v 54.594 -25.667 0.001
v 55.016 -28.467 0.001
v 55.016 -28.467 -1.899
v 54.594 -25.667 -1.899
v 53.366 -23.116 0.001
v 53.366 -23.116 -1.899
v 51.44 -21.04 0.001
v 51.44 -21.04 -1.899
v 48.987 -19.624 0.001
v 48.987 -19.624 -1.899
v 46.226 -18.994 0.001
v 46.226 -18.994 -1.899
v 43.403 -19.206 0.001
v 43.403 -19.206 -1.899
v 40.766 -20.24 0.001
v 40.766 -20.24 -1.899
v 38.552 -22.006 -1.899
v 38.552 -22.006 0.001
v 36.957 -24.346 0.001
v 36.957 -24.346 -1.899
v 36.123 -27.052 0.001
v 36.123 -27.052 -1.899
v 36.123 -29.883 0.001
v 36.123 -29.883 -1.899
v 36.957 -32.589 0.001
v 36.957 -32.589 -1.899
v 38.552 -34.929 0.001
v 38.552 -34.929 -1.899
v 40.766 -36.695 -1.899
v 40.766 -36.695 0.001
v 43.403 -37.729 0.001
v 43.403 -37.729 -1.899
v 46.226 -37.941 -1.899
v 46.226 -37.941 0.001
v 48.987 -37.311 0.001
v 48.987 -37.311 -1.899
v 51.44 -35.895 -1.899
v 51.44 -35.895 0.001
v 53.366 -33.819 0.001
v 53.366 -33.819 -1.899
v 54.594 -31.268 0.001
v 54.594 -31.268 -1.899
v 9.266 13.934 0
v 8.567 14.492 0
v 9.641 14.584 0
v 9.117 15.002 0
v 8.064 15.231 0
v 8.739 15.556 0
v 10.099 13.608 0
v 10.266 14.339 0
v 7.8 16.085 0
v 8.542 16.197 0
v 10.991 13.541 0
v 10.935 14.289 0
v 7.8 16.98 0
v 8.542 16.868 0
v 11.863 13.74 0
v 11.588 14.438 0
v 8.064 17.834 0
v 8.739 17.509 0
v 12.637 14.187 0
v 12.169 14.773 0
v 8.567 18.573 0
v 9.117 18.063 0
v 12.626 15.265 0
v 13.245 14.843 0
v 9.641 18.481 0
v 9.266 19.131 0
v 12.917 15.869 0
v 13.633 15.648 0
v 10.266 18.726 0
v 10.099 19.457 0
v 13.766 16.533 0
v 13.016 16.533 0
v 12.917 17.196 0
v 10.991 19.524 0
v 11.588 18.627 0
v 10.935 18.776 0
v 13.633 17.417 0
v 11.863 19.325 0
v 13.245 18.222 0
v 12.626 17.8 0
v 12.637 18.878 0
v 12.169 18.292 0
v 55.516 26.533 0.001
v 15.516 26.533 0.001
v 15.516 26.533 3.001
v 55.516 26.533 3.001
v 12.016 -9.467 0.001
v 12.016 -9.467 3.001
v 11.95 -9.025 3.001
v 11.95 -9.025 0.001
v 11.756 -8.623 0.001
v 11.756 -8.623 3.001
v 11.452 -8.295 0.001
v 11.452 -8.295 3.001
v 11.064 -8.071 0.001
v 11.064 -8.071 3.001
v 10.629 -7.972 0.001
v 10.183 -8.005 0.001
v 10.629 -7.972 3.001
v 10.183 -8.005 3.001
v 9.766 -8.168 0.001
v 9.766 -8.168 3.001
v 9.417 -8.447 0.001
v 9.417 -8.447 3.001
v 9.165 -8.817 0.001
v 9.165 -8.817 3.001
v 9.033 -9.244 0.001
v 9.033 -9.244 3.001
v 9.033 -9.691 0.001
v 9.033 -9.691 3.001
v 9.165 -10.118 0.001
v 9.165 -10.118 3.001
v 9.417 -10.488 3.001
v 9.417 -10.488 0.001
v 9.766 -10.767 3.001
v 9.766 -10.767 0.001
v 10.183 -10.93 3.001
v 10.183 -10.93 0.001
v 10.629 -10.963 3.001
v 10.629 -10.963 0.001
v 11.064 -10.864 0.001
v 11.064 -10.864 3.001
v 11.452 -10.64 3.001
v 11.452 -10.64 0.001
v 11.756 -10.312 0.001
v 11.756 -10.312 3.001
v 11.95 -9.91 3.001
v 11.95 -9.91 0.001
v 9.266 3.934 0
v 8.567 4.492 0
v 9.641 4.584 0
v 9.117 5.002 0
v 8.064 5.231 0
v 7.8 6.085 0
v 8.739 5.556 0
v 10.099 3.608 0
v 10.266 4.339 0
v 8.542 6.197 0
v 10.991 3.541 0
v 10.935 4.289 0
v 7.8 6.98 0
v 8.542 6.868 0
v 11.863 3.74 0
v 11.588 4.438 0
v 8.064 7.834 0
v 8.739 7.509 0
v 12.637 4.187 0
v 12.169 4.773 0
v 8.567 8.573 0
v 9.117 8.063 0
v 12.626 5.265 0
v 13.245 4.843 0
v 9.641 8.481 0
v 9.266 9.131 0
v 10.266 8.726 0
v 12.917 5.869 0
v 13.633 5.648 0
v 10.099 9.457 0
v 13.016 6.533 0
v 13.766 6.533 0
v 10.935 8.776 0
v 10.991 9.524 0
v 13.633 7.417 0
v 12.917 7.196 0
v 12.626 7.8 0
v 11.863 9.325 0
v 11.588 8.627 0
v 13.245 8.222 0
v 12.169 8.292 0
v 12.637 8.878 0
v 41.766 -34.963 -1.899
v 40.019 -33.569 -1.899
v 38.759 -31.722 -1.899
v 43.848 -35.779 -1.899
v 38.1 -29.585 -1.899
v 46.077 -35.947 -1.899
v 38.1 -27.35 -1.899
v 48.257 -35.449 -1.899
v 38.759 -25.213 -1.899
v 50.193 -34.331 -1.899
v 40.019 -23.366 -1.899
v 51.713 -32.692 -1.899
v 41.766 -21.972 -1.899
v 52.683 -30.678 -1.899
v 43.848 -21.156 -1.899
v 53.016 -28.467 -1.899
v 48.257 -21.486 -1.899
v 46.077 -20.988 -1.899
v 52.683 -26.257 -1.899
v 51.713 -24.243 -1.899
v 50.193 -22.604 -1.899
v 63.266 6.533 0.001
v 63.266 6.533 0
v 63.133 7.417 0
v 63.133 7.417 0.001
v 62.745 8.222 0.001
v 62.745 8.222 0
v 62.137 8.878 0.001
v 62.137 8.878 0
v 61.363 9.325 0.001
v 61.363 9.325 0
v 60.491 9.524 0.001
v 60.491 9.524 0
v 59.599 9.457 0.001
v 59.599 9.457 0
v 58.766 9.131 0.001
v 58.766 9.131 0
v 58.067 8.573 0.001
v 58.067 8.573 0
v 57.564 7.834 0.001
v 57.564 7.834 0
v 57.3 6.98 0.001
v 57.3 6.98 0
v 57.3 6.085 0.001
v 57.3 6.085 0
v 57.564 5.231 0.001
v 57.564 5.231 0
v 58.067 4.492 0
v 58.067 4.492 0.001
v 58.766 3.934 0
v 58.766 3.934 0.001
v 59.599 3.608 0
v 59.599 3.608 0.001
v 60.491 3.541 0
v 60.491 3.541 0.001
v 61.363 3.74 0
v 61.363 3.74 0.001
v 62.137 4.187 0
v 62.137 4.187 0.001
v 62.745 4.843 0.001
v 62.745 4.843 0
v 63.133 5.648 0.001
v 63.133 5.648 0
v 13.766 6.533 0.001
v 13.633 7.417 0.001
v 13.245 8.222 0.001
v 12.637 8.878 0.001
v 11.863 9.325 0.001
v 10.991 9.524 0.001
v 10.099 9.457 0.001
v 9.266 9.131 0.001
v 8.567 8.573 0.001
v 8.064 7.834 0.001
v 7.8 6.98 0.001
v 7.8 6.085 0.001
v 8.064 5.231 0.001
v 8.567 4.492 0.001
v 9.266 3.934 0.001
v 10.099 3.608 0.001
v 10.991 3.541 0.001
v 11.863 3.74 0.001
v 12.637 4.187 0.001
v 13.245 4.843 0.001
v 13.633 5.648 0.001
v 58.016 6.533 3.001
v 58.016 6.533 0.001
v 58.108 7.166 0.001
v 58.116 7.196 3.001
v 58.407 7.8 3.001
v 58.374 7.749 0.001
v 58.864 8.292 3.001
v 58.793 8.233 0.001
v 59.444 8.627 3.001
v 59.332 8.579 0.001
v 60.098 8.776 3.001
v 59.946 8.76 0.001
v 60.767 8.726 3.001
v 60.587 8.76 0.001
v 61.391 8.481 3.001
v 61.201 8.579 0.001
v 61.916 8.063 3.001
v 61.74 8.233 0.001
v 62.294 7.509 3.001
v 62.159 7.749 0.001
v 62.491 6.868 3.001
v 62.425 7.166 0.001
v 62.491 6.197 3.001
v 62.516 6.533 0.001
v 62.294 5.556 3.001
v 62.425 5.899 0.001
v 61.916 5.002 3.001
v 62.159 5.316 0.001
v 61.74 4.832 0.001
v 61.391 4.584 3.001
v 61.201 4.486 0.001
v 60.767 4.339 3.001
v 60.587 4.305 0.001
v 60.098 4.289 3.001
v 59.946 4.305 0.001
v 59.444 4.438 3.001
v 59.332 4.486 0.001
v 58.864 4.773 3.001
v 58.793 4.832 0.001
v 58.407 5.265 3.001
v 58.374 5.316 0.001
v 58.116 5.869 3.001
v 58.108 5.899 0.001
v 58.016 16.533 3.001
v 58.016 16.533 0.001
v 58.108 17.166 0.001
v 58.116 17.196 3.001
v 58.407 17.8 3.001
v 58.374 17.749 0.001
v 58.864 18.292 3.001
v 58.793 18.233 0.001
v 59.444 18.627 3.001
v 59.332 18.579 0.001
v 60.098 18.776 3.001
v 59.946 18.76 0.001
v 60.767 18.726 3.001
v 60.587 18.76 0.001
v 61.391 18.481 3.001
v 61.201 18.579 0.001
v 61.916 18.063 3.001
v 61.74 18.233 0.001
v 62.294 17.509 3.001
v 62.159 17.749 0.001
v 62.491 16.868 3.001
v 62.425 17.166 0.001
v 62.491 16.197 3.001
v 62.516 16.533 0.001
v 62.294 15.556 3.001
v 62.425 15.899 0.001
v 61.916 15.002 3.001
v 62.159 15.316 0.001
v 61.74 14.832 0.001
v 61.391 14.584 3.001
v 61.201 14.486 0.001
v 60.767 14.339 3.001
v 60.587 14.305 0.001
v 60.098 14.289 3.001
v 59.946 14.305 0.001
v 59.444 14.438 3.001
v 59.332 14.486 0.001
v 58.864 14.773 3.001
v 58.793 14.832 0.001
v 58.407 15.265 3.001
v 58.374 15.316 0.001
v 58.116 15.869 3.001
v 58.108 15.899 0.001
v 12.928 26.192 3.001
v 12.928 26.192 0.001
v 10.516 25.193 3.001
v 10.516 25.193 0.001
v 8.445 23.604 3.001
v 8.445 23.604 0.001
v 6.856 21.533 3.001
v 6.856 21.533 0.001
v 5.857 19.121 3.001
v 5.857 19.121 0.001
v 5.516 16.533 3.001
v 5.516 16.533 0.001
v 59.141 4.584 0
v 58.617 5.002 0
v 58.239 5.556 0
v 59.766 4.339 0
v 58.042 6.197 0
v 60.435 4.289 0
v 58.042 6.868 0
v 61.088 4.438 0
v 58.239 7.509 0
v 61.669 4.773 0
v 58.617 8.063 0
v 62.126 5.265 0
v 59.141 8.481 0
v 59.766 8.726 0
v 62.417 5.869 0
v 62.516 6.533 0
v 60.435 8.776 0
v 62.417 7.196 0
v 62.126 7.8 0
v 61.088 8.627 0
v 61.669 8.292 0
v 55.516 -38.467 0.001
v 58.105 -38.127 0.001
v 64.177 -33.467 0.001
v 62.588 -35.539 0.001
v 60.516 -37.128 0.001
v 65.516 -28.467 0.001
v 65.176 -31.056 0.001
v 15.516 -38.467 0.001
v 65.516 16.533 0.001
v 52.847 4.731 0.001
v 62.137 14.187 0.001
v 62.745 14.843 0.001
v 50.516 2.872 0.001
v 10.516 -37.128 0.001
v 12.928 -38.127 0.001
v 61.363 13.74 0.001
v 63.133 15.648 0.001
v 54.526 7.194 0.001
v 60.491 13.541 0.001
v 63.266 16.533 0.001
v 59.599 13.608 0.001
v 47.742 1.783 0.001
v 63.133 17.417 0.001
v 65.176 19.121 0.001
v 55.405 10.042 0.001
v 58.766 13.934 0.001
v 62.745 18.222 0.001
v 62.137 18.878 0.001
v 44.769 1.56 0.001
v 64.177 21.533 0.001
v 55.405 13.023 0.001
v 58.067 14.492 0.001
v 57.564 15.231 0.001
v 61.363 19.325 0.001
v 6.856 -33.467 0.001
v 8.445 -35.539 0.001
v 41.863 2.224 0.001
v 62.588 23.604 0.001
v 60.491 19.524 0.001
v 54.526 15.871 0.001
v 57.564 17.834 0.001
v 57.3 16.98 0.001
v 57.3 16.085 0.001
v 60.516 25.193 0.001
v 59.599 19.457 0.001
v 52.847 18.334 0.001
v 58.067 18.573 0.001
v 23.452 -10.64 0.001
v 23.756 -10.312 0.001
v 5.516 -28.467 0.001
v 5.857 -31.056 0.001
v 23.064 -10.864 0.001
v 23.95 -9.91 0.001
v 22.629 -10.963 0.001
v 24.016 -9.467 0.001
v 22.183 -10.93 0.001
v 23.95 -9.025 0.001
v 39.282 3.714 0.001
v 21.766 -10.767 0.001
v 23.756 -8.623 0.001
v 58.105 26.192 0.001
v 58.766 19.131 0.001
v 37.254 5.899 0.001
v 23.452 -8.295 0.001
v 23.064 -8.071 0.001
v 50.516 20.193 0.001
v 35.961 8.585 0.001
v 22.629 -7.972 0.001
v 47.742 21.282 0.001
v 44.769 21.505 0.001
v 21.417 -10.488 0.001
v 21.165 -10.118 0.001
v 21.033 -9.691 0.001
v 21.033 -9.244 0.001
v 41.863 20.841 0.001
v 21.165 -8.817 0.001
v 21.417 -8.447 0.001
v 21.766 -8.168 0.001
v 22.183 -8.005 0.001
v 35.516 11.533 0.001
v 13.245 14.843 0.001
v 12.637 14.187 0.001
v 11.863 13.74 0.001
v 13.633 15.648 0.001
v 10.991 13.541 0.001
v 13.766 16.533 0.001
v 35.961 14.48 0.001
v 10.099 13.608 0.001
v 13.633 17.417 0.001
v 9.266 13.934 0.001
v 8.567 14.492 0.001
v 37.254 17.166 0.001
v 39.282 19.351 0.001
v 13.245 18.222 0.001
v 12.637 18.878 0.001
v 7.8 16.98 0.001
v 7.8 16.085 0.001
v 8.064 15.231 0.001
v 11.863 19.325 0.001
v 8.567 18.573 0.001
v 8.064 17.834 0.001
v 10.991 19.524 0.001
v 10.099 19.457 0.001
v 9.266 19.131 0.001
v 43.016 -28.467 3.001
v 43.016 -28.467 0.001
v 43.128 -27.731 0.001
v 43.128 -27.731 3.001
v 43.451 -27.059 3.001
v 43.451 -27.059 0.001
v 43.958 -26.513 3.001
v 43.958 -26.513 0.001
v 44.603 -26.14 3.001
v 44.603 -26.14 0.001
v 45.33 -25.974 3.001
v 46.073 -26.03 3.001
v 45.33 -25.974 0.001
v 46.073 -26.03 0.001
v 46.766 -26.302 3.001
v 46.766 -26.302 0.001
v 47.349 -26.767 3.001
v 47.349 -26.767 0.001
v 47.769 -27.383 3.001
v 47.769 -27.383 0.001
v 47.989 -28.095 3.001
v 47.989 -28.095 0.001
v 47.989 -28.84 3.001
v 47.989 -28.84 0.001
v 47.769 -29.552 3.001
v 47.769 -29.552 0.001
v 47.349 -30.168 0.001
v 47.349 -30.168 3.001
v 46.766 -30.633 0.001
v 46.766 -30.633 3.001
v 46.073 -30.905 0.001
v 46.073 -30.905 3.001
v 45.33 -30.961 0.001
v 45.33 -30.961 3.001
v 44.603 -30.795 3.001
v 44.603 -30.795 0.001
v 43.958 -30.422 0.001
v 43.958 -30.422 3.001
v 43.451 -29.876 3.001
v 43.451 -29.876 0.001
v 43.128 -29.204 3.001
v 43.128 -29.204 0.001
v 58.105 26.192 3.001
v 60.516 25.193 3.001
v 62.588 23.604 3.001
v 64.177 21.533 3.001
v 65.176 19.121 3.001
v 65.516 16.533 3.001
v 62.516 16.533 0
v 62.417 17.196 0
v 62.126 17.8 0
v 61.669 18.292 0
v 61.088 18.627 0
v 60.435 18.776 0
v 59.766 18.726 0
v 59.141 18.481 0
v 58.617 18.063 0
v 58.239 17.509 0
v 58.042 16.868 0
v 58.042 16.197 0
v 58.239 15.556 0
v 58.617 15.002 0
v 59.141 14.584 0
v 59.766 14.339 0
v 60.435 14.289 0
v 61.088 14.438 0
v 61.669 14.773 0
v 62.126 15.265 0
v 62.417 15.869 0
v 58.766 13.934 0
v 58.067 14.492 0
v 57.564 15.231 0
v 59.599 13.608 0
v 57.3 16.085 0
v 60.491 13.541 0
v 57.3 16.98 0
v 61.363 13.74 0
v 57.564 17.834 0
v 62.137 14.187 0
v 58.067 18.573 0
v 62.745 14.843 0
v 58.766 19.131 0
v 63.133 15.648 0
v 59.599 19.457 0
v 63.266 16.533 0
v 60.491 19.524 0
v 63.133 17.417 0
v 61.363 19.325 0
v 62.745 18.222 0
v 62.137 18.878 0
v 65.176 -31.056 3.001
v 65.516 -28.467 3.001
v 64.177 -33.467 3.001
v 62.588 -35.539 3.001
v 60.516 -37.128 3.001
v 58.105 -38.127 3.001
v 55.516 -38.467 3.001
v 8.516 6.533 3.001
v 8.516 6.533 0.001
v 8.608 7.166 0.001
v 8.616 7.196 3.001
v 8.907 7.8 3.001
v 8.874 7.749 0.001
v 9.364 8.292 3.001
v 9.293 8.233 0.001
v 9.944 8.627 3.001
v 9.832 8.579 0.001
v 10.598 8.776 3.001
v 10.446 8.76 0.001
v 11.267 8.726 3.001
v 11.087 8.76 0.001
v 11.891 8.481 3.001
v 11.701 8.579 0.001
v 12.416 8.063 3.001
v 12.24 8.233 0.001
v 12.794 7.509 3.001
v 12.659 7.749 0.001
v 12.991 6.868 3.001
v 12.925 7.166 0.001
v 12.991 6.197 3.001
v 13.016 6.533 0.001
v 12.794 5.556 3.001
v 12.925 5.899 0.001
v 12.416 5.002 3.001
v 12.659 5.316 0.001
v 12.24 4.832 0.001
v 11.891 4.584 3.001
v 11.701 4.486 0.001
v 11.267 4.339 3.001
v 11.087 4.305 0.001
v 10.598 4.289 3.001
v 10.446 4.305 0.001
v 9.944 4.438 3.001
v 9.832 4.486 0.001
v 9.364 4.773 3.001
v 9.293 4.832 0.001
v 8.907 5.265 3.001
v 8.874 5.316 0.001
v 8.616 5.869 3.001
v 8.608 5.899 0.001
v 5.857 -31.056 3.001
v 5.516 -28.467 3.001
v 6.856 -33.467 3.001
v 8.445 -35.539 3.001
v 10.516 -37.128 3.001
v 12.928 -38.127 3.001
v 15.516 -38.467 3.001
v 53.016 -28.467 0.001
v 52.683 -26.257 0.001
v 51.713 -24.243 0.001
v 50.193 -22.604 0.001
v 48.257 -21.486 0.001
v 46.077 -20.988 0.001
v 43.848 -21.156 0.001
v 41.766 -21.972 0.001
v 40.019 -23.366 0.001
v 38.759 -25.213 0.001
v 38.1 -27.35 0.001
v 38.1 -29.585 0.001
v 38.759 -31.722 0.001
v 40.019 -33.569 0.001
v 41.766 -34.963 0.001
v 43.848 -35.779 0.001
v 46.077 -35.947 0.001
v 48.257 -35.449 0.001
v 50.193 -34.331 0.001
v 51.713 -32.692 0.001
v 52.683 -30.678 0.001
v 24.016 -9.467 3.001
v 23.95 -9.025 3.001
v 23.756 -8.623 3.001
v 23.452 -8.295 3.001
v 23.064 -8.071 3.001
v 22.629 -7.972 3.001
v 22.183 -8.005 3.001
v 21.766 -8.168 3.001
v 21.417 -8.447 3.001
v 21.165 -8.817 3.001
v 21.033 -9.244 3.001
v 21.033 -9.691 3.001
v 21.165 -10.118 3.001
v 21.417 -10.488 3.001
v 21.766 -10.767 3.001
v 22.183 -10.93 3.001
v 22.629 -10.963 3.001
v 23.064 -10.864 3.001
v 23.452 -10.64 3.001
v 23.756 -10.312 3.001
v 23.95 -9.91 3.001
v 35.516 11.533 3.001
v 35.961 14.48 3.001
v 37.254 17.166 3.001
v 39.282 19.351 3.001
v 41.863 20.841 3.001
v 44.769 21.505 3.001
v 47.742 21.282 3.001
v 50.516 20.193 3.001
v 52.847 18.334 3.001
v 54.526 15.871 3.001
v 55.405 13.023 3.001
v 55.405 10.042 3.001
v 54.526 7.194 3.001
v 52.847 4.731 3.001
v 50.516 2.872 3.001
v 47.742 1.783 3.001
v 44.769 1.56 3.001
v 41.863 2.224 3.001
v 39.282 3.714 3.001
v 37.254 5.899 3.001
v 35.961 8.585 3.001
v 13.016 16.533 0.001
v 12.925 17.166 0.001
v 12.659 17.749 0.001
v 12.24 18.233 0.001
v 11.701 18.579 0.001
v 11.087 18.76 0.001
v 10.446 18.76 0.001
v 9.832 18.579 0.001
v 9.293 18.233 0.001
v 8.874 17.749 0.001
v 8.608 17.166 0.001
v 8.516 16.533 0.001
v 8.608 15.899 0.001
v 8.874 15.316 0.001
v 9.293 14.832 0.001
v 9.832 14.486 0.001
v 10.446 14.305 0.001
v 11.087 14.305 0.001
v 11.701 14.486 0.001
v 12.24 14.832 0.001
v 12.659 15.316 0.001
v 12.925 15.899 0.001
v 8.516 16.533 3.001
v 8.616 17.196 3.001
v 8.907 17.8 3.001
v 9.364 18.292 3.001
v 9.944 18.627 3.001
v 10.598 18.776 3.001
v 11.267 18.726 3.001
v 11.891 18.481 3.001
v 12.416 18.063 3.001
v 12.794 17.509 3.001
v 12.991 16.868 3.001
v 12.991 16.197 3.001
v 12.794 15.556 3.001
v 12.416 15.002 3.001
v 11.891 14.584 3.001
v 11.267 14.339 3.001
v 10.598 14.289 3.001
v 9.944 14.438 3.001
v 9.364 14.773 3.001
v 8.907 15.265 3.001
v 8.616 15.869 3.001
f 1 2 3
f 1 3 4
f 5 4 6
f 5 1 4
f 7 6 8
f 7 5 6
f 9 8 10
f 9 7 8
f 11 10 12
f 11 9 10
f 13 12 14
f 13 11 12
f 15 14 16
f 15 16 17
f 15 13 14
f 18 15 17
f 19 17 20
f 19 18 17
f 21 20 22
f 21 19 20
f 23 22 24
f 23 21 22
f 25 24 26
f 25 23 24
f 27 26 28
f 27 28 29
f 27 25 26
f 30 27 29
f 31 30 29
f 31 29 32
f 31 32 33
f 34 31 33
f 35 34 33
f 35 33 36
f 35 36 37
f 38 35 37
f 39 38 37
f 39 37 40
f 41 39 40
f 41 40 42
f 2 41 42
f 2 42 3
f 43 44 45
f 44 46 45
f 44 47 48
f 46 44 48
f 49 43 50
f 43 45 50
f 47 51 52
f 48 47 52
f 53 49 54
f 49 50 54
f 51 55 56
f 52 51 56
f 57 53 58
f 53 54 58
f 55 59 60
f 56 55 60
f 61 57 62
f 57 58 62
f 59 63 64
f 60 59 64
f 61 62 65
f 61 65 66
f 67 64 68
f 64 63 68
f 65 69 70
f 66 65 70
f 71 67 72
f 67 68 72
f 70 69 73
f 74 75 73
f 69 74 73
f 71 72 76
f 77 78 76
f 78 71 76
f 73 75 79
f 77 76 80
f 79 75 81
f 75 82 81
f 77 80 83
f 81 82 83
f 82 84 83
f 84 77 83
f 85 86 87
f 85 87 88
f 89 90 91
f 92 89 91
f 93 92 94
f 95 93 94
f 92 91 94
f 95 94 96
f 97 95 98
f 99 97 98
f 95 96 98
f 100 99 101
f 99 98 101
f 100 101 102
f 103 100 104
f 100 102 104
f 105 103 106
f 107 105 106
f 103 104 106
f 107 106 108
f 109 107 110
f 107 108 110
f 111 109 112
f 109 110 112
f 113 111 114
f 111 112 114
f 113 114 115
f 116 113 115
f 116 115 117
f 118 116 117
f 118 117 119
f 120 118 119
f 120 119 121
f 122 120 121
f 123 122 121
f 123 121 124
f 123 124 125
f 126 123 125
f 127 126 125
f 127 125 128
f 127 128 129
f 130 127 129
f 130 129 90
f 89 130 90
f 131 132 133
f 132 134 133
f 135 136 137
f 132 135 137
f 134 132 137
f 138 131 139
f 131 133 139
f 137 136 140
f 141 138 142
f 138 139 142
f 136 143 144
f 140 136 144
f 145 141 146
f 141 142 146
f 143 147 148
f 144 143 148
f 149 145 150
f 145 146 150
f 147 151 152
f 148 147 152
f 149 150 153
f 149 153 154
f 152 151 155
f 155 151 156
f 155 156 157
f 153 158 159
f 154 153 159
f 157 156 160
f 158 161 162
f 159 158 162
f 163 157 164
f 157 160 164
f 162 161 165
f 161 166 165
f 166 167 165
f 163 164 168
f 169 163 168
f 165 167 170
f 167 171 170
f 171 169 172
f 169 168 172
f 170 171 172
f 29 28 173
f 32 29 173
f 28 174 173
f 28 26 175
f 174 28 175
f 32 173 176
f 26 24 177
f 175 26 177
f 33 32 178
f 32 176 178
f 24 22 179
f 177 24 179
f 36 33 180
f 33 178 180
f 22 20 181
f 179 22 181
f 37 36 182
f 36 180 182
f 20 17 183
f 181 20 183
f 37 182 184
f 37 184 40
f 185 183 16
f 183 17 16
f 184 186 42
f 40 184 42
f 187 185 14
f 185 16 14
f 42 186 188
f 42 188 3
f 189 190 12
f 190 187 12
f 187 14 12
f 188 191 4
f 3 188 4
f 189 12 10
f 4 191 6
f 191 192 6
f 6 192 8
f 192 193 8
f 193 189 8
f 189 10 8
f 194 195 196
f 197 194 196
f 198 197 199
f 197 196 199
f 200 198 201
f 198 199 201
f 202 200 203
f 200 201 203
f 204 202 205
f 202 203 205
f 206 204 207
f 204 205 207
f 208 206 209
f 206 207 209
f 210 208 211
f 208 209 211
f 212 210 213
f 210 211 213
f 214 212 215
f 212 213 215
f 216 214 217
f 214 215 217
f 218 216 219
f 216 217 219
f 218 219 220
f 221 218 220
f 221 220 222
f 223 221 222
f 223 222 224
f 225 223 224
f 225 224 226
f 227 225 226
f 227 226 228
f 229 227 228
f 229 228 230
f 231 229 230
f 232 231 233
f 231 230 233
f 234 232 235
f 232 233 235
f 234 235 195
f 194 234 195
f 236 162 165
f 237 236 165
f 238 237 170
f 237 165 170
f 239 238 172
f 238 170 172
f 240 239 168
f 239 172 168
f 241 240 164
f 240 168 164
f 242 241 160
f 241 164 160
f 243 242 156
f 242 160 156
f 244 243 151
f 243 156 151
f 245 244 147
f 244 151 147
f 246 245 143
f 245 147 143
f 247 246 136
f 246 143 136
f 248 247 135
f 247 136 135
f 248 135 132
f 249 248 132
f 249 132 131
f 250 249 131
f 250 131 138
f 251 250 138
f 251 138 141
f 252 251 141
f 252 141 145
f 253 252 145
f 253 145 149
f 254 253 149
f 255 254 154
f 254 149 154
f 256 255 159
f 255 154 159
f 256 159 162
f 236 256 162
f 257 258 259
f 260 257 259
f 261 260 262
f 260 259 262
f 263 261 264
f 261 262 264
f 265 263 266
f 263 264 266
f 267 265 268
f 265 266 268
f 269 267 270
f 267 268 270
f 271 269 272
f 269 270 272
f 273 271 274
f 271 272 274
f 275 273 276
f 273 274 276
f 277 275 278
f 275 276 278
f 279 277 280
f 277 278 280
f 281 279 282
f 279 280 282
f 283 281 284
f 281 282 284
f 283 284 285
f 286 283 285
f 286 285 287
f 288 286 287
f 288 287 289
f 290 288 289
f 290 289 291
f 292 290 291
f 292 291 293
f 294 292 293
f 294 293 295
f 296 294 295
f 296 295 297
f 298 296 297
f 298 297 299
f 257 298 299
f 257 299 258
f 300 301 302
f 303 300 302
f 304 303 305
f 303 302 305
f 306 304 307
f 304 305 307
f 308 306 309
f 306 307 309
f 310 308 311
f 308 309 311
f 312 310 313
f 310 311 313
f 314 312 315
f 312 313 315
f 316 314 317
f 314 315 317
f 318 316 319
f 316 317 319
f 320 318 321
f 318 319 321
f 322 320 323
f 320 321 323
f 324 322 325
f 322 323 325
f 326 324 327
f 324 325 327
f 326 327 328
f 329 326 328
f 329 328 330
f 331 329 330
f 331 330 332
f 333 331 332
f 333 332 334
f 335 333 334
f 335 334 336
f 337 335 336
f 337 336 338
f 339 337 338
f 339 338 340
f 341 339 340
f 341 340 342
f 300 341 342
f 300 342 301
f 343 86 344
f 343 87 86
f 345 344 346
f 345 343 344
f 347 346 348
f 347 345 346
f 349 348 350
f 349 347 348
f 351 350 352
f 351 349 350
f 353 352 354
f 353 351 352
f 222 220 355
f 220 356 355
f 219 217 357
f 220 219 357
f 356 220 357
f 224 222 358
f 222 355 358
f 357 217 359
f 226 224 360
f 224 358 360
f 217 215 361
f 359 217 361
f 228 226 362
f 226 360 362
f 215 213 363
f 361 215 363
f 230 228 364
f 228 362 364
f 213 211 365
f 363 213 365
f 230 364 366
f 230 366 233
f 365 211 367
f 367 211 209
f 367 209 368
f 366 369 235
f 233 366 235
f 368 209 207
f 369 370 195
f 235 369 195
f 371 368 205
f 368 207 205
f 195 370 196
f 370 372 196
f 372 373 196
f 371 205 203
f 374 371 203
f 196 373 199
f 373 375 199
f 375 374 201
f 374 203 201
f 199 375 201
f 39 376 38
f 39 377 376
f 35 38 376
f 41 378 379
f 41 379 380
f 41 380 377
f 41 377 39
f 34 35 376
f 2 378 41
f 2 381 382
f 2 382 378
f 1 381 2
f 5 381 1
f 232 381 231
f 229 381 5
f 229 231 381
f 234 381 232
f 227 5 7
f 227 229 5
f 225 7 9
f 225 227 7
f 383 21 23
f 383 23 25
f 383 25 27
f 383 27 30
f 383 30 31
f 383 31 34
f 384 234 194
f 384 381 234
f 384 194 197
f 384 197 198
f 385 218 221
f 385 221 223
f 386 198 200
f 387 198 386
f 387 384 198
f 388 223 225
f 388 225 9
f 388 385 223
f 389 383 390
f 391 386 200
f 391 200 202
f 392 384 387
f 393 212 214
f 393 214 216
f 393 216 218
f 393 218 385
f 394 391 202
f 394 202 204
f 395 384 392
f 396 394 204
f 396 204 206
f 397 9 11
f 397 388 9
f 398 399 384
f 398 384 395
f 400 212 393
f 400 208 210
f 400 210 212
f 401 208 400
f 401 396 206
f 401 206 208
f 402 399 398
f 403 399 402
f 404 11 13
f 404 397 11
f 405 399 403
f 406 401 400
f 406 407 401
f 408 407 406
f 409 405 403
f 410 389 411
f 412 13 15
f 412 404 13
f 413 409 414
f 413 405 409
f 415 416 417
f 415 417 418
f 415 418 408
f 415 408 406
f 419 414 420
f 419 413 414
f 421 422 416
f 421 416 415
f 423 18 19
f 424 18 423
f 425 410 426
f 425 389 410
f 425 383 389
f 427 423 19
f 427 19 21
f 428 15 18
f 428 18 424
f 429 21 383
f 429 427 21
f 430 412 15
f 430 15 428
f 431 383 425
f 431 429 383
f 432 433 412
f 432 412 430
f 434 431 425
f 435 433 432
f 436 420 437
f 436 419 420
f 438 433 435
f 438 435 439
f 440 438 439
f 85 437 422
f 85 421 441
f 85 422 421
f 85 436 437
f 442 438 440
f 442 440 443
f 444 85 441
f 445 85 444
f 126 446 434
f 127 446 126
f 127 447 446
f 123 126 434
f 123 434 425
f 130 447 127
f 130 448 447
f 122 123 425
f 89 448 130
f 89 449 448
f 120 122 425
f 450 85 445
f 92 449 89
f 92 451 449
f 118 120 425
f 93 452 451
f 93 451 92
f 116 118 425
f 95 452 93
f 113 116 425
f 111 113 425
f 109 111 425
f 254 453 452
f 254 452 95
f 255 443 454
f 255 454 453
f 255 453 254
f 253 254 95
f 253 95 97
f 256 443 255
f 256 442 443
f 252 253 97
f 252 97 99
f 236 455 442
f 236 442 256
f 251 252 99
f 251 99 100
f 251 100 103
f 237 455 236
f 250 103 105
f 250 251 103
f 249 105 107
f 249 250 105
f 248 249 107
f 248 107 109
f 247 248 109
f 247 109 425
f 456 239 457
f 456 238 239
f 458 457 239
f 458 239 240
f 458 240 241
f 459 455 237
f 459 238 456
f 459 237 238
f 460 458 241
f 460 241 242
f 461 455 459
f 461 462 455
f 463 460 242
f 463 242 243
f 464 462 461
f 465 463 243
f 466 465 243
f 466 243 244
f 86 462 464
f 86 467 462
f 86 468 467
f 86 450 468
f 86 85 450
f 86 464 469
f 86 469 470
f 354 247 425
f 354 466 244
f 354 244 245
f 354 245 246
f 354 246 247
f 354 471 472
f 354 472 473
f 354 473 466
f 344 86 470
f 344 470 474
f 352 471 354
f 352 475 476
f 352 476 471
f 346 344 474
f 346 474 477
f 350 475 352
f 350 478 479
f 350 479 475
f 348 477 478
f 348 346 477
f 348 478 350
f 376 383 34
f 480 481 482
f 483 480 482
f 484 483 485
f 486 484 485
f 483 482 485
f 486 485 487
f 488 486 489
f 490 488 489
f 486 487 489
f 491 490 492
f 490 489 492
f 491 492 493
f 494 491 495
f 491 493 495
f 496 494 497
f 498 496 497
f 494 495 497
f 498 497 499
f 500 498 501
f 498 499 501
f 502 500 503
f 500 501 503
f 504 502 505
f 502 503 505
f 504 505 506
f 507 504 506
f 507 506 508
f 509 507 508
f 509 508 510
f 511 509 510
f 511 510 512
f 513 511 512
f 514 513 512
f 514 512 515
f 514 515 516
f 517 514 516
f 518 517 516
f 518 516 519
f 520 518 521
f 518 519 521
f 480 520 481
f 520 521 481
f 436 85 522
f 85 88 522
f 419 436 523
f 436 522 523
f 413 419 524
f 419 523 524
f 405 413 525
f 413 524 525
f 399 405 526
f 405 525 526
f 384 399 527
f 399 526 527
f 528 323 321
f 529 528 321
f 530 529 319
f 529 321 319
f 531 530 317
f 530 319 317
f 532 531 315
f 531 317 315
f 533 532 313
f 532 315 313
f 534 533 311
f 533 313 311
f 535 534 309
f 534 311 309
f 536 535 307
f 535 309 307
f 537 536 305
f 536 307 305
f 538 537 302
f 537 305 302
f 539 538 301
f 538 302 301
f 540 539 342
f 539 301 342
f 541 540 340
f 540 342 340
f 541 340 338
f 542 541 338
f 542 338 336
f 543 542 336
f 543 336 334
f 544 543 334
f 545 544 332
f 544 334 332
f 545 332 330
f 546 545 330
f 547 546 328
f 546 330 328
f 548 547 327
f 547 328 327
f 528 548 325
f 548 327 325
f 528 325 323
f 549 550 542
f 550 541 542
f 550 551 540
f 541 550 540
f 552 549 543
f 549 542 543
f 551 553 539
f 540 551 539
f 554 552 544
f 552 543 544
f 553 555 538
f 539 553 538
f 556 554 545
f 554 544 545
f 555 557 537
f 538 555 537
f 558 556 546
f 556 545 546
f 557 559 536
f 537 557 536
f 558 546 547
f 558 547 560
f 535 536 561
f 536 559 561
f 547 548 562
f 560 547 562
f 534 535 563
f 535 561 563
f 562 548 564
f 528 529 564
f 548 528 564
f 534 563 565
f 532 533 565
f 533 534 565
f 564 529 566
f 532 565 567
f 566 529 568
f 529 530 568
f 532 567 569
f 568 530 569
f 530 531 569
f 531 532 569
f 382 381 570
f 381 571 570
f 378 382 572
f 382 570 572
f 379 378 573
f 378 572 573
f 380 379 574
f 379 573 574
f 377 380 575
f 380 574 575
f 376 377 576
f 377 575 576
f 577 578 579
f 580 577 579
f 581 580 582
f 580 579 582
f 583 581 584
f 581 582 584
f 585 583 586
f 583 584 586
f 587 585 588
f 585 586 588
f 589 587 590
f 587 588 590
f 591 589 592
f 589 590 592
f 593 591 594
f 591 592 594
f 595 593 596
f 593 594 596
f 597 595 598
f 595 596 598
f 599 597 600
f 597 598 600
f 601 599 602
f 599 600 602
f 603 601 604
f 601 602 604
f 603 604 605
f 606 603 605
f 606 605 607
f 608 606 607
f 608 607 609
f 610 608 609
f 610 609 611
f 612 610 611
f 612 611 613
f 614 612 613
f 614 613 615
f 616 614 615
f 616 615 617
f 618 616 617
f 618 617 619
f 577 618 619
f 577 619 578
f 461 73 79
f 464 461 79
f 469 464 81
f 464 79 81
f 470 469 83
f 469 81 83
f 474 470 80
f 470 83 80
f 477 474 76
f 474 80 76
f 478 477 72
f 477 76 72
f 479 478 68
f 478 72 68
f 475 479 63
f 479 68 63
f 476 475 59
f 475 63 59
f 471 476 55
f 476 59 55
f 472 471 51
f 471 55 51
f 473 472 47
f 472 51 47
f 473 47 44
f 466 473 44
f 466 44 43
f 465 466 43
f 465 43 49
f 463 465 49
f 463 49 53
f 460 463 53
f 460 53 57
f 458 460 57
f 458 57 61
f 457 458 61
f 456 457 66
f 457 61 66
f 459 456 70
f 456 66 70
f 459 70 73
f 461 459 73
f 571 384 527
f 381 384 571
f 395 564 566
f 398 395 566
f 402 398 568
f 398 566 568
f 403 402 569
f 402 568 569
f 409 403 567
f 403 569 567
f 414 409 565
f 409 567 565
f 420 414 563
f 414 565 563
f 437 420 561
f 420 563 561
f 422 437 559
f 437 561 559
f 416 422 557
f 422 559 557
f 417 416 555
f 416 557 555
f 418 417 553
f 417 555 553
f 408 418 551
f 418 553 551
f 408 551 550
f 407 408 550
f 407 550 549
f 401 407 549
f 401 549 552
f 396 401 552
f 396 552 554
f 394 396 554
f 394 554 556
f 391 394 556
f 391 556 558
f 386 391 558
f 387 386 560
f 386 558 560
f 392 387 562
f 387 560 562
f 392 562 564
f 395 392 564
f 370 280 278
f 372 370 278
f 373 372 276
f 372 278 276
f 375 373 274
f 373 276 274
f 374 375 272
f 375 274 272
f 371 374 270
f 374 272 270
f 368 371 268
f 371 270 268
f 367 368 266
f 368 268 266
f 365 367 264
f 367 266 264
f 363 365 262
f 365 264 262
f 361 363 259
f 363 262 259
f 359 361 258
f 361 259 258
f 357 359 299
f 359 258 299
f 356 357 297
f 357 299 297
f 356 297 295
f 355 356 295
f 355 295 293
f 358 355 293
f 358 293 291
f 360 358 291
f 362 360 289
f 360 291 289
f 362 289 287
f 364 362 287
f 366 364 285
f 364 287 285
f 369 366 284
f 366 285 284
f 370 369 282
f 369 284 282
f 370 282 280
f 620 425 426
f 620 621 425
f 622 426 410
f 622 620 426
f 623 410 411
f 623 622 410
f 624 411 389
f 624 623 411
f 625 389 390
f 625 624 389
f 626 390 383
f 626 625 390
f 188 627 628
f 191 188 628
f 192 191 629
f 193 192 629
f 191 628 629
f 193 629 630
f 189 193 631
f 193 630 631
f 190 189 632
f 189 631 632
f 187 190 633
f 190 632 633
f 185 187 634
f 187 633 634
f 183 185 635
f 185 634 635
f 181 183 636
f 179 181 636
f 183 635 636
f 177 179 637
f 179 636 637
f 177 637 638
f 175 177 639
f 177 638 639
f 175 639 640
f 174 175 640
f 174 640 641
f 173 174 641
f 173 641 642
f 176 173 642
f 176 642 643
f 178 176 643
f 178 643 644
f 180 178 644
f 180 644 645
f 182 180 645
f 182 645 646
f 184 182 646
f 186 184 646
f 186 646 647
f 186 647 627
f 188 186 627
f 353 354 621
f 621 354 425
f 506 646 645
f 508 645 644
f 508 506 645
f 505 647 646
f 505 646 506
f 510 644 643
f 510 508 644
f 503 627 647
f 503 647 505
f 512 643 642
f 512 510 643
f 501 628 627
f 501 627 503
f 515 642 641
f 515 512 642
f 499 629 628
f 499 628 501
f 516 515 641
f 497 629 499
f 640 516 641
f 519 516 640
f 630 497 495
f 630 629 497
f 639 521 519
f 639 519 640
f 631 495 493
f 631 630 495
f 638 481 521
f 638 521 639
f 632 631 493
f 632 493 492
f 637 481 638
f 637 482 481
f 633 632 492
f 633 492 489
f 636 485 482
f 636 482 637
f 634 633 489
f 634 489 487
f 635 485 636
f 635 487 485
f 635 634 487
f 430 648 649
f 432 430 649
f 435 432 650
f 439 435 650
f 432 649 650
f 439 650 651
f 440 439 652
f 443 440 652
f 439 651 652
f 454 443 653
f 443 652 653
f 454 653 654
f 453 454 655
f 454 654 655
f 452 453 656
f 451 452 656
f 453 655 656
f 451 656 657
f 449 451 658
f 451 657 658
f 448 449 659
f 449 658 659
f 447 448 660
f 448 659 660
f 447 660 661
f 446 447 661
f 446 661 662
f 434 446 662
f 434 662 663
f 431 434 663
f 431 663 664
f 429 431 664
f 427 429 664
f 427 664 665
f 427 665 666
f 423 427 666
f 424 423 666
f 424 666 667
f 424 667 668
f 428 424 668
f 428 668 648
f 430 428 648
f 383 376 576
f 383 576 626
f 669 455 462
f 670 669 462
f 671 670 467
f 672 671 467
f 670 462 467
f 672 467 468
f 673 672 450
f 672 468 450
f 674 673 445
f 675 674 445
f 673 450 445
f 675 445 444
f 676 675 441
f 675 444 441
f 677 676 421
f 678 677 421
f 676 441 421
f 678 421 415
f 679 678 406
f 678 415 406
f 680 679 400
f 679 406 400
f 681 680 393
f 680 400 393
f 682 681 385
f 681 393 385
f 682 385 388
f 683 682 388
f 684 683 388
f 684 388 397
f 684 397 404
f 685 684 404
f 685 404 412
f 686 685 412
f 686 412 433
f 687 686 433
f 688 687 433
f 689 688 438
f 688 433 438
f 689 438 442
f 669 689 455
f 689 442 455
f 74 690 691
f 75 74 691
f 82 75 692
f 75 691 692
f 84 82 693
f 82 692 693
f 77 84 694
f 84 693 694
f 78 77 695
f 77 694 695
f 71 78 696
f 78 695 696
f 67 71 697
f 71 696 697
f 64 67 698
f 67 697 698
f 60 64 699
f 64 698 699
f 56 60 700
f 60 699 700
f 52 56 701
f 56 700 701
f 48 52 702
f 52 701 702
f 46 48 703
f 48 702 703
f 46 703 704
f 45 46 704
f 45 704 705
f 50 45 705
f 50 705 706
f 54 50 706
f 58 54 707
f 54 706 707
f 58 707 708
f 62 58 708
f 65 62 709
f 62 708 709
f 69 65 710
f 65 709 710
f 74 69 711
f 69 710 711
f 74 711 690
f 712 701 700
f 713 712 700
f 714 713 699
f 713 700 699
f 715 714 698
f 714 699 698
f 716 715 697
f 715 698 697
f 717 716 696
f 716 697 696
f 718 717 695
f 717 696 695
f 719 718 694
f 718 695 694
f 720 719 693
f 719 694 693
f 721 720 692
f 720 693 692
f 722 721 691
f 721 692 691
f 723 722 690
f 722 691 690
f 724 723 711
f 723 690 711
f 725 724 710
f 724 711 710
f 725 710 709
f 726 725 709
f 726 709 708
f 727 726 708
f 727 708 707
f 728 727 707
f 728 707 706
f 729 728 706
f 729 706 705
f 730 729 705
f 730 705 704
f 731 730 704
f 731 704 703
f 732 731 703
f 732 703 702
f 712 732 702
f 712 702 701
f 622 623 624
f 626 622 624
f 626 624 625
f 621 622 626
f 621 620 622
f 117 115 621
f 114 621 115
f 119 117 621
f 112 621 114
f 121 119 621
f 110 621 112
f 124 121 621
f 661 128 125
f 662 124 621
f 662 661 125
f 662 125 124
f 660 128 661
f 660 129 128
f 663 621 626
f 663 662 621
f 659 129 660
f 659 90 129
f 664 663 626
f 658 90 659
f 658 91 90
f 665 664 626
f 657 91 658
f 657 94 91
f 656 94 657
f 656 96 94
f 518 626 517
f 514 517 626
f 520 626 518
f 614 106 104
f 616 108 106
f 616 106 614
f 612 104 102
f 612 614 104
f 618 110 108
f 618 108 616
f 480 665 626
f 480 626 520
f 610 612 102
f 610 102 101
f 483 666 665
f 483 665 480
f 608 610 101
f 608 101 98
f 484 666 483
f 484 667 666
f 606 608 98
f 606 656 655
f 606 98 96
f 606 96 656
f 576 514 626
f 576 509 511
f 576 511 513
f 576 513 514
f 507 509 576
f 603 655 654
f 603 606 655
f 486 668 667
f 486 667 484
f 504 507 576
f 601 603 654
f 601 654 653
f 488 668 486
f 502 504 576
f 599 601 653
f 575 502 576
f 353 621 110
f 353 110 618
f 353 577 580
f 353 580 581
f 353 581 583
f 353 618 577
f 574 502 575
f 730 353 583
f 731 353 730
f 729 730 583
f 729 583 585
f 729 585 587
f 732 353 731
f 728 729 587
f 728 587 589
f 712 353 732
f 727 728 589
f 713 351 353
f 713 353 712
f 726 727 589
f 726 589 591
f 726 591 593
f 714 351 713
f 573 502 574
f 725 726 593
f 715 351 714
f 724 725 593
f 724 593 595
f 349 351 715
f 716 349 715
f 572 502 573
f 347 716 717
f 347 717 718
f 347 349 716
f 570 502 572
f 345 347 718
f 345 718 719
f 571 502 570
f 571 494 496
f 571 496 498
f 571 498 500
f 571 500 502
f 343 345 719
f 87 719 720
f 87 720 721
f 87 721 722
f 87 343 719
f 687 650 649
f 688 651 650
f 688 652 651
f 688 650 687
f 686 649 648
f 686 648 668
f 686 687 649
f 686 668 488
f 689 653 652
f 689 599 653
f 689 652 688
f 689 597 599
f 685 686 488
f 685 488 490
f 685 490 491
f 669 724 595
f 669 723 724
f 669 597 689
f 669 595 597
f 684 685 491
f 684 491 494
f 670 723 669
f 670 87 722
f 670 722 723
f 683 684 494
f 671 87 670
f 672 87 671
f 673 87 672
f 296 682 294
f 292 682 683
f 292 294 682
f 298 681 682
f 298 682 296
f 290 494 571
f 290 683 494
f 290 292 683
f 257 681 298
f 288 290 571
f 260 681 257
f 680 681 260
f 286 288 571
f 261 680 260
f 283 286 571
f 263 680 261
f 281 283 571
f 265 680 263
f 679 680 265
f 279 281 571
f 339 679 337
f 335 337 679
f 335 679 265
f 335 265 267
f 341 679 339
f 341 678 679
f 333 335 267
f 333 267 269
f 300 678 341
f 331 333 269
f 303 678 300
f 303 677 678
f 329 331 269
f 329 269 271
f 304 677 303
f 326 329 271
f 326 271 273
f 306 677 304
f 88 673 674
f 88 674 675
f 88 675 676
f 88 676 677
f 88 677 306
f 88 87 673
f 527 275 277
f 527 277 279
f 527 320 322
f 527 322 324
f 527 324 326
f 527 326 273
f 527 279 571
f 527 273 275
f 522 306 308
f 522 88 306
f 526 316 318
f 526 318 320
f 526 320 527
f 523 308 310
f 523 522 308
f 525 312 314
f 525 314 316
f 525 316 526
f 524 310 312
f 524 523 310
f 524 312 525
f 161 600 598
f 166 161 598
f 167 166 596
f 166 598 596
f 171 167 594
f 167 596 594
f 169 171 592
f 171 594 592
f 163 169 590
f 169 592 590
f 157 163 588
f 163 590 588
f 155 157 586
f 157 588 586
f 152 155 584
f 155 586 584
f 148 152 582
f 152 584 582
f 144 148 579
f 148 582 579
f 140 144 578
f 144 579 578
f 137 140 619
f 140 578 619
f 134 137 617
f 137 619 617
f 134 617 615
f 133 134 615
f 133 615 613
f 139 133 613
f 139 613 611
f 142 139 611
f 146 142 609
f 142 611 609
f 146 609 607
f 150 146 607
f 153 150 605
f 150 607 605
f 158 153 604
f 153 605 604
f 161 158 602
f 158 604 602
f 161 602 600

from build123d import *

# Parameters (mm, degrees)
SKETCH_3_R               = 3
EXTRUDE_6_DEPTH          = 0.001
EXTRUDE_6_2_DEPTH        = 0.001
EXTRUDE_6_3_DEPTH        = 0.001
EXTRUDE_6_4_DEPTH        = 0.001
SKETCH_11_R              = 2.25
CUT_EXTRUDE_2_DEPTH      = 1
CUT_EXTRUDE_2_DEPTH_BACK = 1.001
EXTRUDE_7_DEPTH          = 3
SKETCH_14_R              = 2.25
SKETCH_14_R_2            = 10
CUT_EXTRUDE_3_DEPTH      = 3
SKETCH_15_R              = 10
SKETCH_15_R_2            = 2.5
CUT_EXTRUDE_4_DEPTH      = 3
SKETCH_16_R              = 1.5
CUT_EXTRUDE_5_DEPTH      = 10
SKETCH_17_R              = 9.5
SKETCH_17_R_2            = 7.5
EXTRUDE_8_DEPTH          = 4.9
FILLET_1_R               = 10


with BuildPart() as part:
    # 草图3 → 凸台-拉伸6 (new body)
    with BuildSketch(Plane.XY):
        with Locations((60.266478541, 16.532501821)):
            Circle(SKETCH_3_R)
    extrude(amount=EXTRUDE_6_DEPTH)


with BuildPart() as body_2:
    # 草图3 → Extrude 6 2 (new body)
    with BuildSketch(Plane.XY):
        with Locations((60.266478541, 6.532501821)):
            Circle(SKETCH_3_R)
    extrude(amount=EXTRUDE_6_2_DEPTH)


with BuildPart() as body_3:
    # 草图3 → Extrude 6 3 (new body)
    with BuildSketch(Plane.XY):
        with Locations((10.766478541, 6.532501821)):
            Circle(SKETCH_3_R)
    extrude(amount=EXTRUDE_6_3_DEPTH)


with BuildPart() as body_4:
    # 草图3 → Extrude 6 4 (new body)
    with BuildSketch(Plane.XY):
        with Locations((10.766478541, 16.532501821)):
            Circle(SKETCH_3_R)
    extrude(amount=EXTRUDE_6_4_DEPTH)


with BuildPart() as cut_extrude_2_tool:
    # 草图11 → 切除-拉伸2 (new body, two sides)
    with BuildSketch(Plane.XY.offset(0.001)) as cut_extrude_2_sk:
        with Locations((10.766478541, 16.532501821)):
            Circle(SKETCH_11_R)
        with Locations((10.766478541, 6.532501821)):
            Circle(SKETCH_11_R)
        with Locations((60.266478541, 16.532501821)):
            Circle(SKETCH_11_R)
        with Locations((60.266478541, 6.532501821)):
            Circle(SKETCH_11_R)
    extrude(amount=CUT_EXTRUDE_2_DEPTH)
    extrude(cut_extrude_2_sk.sketch, amount=-CUT_EXTRUDE_2_DEPTH_BACK)


with BuildPart() as part_1:
    add(part.part)

    # 切除-拉伸2: cut by cut_extrude_2_tool
    add(cut_extrude_2_tool.part, mode=Mode.SUBTRACT)



with BuildPart() as body_2_1:
    add(body_2.part)

    # 切除-拉伸2: cut by cut_extrude_2_tool
    add(cut_extrude_2_tool.part, mode=Mode.SUBTRACT)


with BuildPart() as body_3_1:
    add(body_3.part)

    # 切除-拉伸2: cut by cut_extrude_2_tool
    add(cut_extrude_2_tool.part, mode=Mode.SUBTRACT)


with BuildPart() as body_4_1:
    add(body_4.part)

    # 切除-拉伸2: cut by cut_extrude_2_tool
    add(cut_extrude_2_tool.part, mode=Mode.SUBTRACT)


with BuildPart() as part_2:
    add(part_1.part)

    add(body_2_1.part)  # 凸台-拉伸7 merges body 2

    add(body_3_1.part)  # 凸台-拉伸7 merges body 3

    add(body_4_1.part)  # 凸台-拉伸7 merges body 4
    # 草图12 → 凸台-拉伸7 (add)
    with BuildSketch(Plane.XY.offset(0.001)):
        Polygon((5.516478541, 26.532501821), (65.516478541, 26.532501821), (65.516478541, -38.467498179), (5.516478541, -38.467498179), (5.516478541, 1.532501821), align=None)
    extrude(amount=EXTRUDE_7_DEPTH)

    # 草图14 → 切除-拉伸3 (cut)
    with BuildSketch(Plane(origin=(0, 0, 0.001), x_dir=(-1, 0, 0), z_dir=(0, 0, -1))):
        with Locations((-60.266478541, 6.532501821)):
            Circle(SKETCH_14_R)
        with Locations((-60.266478541, 16.532501821)):
            Circle(SKETCH_14_R)
        with Locations((-10.766478541, 6.532501821)):
            Circle(SKETCH_14_R)
        with Locations((-10.766478541, 16.532501821)):
            Circle(SKETCH_14_R)
        with Locations((-45.516478541, 11.532501821)):
            Circle(SKETCH_14_R_2)
    extrude(amount=-CUT_EXTRUDE_3_DEPTH, mode=Mode.SUBTRACT)

    # 草图15 → 切除-拉伸4 (cut)
    with BuildSketch(Plane(origin=(0, 0, 0.001), x_dir=(-1, 0, 0), z_dir=(0, 0, -1))):
        with Locations((-45.516478541, 11.532501821)):
            Circle(SKETCH_15_R)
        with Locations((-45.516478541, -28.467498179)):
            Circle(SKETCH_15_R_2)
    extrude(amount=-CUT_EXTRUDE_4_DEPTH, mode=Mode.SUBTRACT)

    # 草图16 → 切除-拉伸5 (cut)
    with BuildSketch(Plane.XY.offset(3.001)):
        with Locations((10.516478541, -9.467498179)):
            Circle(SKETCH_16_R)
        with Locations((22.516478541, -9.467498179)):
            Circle(SKETCH_16_R)
    extrude(amount=-CUT_EXTRUDE_5_DEPTH, mode=Mode.SUBTRACT)

    # 草图17 → 凸台-拉伸8 (add)
    with BuildSketch(Plane.XY.offset(3.001)):
        with Locations((45.516478541, -28.467498179)):
            Circle(SKETCH_17_R)
        with Locations((45.516478541, -28.467498179)):
            Circle(SKETCH_17_R_2, mode=Mode.SUBTRACT)
    extrude(amount=-EXTRUDE_8_DEPTH)

    # 圆角1
    fillet_1_edges = [part_2.edges().sort_by_distance(p)[0] for p in [
        (5.516478541, 26.532501821, 1.501),
        (5.516478541, -38.467498179, 1.501),
        (65.516478541, -38.467498179, 1.501),
        (65.516478541, 26.532501821, 1.501),
    ]]
    fillet(fillet_1_edges, radius=FILLET_1_R)


solid = part_2.part
